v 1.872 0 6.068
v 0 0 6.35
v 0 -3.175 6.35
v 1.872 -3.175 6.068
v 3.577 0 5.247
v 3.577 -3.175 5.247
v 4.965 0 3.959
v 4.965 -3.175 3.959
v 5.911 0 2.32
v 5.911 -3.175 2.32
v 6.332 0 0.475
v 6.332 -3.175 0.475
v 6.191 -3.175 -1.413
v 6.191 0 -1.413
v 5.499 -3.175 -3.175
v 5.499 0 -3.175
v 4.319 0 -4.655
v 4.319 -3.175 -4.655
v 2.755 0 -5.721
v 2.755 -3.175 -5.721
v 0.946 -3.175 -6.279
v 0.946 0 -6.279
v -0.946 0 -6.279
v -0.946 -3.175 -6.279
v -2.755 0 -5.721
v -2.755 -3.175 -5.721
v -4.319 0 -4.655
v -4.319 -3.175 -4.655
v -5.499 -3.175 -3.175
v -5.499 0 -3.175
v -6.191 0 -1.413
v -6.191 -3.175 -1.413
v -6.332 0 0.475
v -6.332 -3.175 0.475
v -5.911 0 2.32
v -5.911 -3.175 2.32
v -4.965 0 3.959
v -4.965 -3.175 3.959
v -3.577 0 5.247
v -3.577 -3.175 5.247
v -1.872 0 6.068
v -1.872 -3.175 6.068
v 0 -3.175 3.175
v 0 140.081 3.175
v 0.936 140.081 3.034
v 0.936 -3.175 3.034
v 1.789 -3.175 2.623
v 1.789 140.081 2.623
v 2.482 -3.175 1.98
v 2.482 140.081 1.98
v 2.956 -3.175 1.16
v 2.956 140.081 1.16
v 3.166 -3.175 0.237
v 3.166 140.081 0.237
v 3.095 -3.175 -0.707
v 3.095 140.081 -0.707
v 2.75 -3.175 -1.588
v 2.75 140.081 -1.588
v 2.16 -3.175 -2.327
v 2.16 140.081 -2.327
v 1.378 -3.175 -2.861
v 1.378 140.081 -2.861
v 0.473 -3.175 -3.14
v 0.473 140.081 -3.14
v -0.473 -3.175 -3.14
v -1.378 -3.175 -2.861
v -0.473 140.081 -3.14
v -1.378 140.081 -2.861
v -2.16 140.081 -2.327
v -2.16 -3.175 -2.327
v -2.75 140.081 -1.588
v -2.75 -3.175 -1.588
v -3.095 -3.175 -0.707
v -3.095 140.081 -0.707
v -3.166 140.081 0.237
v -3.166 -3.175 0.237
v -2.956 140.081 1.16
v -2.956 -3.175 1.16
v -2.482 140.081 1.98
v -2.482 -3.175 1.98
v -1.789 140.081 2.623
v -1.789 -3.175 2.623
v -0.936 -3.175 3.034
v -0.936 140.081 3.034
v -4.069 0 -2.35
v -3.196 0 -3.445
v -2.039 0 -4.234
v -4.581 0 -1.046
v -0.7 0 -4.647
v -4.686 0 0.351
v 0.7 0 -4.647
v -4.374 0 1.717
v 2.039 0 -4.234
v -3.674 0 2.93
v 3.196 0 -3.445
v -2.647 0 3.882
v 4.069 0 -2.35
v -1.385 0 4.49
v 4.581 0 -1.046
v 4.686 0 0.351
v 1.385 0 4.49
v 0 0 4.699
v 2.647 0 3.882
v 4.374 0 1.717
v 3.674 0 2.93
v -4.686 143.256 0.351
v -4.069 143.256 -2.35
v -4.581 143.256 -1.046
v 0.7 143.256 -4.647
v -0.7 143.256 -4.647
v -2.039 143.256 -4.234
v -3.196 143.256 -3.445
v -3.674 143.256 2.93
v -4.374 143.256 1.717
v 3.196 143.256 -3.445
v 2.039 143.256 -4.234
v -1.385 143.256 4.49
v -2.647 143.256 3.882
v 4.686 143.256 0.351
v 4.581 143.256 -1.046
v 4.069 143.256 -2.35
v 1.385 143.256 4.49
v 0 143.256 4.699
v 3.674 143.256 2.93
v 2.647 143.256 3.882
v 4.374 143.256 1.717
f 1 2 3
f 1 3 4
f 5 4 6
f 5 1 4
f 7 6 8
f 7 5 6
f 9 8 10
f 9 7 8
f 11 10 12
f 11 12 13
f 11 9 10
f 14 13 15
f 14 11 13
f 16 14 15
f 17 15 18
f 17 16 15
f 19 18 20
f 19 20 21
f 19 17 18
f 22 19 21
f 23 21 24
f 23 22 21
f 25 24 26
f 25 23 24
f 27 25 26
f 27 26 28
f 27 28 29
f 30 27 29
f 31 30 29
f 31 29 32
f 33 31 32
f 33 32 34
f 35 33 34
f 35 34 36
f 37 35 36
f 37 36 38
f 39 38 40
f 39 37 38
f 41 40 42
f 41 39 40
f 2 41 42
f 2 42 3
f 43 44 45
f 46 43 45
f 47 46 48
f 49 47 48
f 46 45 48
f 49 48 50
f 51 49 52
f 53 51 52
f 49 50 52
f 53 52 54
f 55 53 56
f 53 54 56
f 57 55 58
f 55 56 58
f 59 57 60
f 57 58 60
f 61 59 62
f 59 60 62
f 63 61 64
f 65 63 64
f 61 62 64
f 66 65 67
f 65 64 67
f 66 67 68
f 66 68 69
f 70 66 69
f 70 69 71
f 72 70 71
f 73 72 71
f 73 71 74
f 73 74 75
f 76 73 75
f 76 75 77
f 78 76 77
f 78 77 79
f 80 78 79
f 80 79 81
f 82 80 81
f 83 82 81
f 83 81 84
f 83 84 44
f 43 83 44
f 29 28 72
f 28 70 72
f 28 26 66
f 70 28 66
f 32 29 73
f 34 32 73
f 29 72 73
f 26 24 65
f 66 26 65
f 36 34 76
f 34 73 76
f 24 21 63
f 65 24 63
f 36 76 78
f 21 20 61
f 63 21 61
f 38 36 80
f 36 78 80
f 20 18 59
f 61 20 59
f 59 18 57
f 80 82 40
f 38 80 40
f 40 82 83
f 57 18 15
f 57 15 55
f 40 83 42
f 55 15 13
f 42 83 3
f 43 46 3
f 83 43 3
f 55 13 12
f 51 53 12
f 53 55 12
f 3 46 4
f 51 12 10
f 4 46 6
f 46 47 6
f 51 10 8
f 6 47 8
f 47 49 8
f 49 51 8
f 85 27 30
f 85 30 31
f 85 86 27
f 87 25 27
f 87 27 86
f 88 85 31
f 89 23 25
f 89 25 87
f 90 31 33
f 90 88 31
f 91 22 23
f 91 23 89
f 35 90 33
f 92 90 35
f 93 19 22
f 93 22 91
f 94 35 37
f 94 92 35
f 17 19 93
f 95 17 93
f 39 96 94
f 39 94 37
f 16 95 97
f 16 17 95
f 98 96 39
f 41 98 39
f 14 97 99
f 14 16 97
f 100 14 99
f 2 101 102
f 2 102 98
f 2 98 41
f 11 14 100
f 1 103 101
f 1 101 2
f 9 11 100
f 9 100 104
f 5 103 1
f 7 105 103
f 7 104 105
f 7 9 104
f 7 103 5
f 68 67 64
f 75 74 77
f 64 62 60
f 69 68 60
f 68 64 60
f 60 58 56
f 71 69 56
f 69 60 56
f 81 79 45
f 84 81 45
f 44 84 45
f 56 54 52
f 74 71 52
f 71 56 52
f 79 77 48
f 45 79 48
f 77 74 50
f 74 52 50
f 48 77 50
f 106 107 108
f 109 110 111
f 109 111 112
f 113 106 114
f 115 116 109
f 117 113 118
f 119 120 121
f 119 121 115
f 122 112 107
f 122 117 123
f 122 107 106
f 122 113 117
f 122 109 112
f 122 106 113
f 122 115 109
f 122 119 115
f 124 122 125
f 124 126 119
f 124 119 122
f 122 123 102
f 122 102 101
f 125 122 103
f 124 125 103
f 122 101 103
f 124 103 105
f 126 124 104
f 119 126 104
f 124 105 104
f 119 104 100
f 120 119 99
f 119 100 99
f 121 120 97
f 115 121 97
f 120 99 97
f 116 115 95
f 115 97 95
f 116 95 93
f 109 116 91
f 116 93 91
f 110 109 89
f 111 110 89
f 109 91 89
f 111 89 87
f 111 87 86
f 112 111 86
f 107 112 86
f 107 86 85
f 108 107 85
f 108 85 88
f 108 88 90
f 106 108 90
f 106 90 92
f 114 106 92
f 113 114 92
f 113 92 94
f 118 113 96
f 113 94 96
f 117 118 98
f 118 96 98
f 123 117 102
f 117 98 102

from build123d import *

# Parameters (mm, degrees)
SKETCH1_R                        = 6.35
BOSS_EXTRUDE1_DEPTH              = 3.175
SKETCH2_R                        = 4.699
BOSS_EXTRUDE2_DEPTH              = 143.256
F_97_0_0059_DIAMETER_HOLE1_D     = 6.35
F_97_0_0059_DIAMETER_HOLE1_DEPTH = 143.256


with BuildPart() as part:
    # Sketch1 → Boss-Extrude1 (new body)
    with BuildSketch(Plane(origin=(0, 0, 0), x_dir=(1, 0, 0), z_dir=(0, 1, 0))):
        with Locations(Location((0, 0, 0), (0, 0, 270))):
            Circle(SKETCH1_R)
    extrude(amount=-BOSS_EXTRUDE1_DEPTH)

    # Sketch2 → Boss-Extrude2 (add)
    with BuildSketch(Plane(origin=(0, 0, 0), x_dir=(1, 0, 0), z_dir=(0, 1, 0))):
        with Locations(Location((0, 0, 0), (0, 0, 270))):
            Circle(SKETCH2_R)
    extrude(amount=BOSS_EXTRUDE2_DEPTH)

    # #97 (0.0059) Diameter Hole1
    with Locations(Plane(origin=(0, -3.175, 0), x_dir=(0, 0, -1), z_dir=(0, -1, 0))):
        with Locations((0, 0)):
            Hole(F_97_0_0059_DIAMETER_HOLE1_D / 2, depth=F_97_0_0059_DIAMETER_HOLE1_DEPTH)


solid = part.part
